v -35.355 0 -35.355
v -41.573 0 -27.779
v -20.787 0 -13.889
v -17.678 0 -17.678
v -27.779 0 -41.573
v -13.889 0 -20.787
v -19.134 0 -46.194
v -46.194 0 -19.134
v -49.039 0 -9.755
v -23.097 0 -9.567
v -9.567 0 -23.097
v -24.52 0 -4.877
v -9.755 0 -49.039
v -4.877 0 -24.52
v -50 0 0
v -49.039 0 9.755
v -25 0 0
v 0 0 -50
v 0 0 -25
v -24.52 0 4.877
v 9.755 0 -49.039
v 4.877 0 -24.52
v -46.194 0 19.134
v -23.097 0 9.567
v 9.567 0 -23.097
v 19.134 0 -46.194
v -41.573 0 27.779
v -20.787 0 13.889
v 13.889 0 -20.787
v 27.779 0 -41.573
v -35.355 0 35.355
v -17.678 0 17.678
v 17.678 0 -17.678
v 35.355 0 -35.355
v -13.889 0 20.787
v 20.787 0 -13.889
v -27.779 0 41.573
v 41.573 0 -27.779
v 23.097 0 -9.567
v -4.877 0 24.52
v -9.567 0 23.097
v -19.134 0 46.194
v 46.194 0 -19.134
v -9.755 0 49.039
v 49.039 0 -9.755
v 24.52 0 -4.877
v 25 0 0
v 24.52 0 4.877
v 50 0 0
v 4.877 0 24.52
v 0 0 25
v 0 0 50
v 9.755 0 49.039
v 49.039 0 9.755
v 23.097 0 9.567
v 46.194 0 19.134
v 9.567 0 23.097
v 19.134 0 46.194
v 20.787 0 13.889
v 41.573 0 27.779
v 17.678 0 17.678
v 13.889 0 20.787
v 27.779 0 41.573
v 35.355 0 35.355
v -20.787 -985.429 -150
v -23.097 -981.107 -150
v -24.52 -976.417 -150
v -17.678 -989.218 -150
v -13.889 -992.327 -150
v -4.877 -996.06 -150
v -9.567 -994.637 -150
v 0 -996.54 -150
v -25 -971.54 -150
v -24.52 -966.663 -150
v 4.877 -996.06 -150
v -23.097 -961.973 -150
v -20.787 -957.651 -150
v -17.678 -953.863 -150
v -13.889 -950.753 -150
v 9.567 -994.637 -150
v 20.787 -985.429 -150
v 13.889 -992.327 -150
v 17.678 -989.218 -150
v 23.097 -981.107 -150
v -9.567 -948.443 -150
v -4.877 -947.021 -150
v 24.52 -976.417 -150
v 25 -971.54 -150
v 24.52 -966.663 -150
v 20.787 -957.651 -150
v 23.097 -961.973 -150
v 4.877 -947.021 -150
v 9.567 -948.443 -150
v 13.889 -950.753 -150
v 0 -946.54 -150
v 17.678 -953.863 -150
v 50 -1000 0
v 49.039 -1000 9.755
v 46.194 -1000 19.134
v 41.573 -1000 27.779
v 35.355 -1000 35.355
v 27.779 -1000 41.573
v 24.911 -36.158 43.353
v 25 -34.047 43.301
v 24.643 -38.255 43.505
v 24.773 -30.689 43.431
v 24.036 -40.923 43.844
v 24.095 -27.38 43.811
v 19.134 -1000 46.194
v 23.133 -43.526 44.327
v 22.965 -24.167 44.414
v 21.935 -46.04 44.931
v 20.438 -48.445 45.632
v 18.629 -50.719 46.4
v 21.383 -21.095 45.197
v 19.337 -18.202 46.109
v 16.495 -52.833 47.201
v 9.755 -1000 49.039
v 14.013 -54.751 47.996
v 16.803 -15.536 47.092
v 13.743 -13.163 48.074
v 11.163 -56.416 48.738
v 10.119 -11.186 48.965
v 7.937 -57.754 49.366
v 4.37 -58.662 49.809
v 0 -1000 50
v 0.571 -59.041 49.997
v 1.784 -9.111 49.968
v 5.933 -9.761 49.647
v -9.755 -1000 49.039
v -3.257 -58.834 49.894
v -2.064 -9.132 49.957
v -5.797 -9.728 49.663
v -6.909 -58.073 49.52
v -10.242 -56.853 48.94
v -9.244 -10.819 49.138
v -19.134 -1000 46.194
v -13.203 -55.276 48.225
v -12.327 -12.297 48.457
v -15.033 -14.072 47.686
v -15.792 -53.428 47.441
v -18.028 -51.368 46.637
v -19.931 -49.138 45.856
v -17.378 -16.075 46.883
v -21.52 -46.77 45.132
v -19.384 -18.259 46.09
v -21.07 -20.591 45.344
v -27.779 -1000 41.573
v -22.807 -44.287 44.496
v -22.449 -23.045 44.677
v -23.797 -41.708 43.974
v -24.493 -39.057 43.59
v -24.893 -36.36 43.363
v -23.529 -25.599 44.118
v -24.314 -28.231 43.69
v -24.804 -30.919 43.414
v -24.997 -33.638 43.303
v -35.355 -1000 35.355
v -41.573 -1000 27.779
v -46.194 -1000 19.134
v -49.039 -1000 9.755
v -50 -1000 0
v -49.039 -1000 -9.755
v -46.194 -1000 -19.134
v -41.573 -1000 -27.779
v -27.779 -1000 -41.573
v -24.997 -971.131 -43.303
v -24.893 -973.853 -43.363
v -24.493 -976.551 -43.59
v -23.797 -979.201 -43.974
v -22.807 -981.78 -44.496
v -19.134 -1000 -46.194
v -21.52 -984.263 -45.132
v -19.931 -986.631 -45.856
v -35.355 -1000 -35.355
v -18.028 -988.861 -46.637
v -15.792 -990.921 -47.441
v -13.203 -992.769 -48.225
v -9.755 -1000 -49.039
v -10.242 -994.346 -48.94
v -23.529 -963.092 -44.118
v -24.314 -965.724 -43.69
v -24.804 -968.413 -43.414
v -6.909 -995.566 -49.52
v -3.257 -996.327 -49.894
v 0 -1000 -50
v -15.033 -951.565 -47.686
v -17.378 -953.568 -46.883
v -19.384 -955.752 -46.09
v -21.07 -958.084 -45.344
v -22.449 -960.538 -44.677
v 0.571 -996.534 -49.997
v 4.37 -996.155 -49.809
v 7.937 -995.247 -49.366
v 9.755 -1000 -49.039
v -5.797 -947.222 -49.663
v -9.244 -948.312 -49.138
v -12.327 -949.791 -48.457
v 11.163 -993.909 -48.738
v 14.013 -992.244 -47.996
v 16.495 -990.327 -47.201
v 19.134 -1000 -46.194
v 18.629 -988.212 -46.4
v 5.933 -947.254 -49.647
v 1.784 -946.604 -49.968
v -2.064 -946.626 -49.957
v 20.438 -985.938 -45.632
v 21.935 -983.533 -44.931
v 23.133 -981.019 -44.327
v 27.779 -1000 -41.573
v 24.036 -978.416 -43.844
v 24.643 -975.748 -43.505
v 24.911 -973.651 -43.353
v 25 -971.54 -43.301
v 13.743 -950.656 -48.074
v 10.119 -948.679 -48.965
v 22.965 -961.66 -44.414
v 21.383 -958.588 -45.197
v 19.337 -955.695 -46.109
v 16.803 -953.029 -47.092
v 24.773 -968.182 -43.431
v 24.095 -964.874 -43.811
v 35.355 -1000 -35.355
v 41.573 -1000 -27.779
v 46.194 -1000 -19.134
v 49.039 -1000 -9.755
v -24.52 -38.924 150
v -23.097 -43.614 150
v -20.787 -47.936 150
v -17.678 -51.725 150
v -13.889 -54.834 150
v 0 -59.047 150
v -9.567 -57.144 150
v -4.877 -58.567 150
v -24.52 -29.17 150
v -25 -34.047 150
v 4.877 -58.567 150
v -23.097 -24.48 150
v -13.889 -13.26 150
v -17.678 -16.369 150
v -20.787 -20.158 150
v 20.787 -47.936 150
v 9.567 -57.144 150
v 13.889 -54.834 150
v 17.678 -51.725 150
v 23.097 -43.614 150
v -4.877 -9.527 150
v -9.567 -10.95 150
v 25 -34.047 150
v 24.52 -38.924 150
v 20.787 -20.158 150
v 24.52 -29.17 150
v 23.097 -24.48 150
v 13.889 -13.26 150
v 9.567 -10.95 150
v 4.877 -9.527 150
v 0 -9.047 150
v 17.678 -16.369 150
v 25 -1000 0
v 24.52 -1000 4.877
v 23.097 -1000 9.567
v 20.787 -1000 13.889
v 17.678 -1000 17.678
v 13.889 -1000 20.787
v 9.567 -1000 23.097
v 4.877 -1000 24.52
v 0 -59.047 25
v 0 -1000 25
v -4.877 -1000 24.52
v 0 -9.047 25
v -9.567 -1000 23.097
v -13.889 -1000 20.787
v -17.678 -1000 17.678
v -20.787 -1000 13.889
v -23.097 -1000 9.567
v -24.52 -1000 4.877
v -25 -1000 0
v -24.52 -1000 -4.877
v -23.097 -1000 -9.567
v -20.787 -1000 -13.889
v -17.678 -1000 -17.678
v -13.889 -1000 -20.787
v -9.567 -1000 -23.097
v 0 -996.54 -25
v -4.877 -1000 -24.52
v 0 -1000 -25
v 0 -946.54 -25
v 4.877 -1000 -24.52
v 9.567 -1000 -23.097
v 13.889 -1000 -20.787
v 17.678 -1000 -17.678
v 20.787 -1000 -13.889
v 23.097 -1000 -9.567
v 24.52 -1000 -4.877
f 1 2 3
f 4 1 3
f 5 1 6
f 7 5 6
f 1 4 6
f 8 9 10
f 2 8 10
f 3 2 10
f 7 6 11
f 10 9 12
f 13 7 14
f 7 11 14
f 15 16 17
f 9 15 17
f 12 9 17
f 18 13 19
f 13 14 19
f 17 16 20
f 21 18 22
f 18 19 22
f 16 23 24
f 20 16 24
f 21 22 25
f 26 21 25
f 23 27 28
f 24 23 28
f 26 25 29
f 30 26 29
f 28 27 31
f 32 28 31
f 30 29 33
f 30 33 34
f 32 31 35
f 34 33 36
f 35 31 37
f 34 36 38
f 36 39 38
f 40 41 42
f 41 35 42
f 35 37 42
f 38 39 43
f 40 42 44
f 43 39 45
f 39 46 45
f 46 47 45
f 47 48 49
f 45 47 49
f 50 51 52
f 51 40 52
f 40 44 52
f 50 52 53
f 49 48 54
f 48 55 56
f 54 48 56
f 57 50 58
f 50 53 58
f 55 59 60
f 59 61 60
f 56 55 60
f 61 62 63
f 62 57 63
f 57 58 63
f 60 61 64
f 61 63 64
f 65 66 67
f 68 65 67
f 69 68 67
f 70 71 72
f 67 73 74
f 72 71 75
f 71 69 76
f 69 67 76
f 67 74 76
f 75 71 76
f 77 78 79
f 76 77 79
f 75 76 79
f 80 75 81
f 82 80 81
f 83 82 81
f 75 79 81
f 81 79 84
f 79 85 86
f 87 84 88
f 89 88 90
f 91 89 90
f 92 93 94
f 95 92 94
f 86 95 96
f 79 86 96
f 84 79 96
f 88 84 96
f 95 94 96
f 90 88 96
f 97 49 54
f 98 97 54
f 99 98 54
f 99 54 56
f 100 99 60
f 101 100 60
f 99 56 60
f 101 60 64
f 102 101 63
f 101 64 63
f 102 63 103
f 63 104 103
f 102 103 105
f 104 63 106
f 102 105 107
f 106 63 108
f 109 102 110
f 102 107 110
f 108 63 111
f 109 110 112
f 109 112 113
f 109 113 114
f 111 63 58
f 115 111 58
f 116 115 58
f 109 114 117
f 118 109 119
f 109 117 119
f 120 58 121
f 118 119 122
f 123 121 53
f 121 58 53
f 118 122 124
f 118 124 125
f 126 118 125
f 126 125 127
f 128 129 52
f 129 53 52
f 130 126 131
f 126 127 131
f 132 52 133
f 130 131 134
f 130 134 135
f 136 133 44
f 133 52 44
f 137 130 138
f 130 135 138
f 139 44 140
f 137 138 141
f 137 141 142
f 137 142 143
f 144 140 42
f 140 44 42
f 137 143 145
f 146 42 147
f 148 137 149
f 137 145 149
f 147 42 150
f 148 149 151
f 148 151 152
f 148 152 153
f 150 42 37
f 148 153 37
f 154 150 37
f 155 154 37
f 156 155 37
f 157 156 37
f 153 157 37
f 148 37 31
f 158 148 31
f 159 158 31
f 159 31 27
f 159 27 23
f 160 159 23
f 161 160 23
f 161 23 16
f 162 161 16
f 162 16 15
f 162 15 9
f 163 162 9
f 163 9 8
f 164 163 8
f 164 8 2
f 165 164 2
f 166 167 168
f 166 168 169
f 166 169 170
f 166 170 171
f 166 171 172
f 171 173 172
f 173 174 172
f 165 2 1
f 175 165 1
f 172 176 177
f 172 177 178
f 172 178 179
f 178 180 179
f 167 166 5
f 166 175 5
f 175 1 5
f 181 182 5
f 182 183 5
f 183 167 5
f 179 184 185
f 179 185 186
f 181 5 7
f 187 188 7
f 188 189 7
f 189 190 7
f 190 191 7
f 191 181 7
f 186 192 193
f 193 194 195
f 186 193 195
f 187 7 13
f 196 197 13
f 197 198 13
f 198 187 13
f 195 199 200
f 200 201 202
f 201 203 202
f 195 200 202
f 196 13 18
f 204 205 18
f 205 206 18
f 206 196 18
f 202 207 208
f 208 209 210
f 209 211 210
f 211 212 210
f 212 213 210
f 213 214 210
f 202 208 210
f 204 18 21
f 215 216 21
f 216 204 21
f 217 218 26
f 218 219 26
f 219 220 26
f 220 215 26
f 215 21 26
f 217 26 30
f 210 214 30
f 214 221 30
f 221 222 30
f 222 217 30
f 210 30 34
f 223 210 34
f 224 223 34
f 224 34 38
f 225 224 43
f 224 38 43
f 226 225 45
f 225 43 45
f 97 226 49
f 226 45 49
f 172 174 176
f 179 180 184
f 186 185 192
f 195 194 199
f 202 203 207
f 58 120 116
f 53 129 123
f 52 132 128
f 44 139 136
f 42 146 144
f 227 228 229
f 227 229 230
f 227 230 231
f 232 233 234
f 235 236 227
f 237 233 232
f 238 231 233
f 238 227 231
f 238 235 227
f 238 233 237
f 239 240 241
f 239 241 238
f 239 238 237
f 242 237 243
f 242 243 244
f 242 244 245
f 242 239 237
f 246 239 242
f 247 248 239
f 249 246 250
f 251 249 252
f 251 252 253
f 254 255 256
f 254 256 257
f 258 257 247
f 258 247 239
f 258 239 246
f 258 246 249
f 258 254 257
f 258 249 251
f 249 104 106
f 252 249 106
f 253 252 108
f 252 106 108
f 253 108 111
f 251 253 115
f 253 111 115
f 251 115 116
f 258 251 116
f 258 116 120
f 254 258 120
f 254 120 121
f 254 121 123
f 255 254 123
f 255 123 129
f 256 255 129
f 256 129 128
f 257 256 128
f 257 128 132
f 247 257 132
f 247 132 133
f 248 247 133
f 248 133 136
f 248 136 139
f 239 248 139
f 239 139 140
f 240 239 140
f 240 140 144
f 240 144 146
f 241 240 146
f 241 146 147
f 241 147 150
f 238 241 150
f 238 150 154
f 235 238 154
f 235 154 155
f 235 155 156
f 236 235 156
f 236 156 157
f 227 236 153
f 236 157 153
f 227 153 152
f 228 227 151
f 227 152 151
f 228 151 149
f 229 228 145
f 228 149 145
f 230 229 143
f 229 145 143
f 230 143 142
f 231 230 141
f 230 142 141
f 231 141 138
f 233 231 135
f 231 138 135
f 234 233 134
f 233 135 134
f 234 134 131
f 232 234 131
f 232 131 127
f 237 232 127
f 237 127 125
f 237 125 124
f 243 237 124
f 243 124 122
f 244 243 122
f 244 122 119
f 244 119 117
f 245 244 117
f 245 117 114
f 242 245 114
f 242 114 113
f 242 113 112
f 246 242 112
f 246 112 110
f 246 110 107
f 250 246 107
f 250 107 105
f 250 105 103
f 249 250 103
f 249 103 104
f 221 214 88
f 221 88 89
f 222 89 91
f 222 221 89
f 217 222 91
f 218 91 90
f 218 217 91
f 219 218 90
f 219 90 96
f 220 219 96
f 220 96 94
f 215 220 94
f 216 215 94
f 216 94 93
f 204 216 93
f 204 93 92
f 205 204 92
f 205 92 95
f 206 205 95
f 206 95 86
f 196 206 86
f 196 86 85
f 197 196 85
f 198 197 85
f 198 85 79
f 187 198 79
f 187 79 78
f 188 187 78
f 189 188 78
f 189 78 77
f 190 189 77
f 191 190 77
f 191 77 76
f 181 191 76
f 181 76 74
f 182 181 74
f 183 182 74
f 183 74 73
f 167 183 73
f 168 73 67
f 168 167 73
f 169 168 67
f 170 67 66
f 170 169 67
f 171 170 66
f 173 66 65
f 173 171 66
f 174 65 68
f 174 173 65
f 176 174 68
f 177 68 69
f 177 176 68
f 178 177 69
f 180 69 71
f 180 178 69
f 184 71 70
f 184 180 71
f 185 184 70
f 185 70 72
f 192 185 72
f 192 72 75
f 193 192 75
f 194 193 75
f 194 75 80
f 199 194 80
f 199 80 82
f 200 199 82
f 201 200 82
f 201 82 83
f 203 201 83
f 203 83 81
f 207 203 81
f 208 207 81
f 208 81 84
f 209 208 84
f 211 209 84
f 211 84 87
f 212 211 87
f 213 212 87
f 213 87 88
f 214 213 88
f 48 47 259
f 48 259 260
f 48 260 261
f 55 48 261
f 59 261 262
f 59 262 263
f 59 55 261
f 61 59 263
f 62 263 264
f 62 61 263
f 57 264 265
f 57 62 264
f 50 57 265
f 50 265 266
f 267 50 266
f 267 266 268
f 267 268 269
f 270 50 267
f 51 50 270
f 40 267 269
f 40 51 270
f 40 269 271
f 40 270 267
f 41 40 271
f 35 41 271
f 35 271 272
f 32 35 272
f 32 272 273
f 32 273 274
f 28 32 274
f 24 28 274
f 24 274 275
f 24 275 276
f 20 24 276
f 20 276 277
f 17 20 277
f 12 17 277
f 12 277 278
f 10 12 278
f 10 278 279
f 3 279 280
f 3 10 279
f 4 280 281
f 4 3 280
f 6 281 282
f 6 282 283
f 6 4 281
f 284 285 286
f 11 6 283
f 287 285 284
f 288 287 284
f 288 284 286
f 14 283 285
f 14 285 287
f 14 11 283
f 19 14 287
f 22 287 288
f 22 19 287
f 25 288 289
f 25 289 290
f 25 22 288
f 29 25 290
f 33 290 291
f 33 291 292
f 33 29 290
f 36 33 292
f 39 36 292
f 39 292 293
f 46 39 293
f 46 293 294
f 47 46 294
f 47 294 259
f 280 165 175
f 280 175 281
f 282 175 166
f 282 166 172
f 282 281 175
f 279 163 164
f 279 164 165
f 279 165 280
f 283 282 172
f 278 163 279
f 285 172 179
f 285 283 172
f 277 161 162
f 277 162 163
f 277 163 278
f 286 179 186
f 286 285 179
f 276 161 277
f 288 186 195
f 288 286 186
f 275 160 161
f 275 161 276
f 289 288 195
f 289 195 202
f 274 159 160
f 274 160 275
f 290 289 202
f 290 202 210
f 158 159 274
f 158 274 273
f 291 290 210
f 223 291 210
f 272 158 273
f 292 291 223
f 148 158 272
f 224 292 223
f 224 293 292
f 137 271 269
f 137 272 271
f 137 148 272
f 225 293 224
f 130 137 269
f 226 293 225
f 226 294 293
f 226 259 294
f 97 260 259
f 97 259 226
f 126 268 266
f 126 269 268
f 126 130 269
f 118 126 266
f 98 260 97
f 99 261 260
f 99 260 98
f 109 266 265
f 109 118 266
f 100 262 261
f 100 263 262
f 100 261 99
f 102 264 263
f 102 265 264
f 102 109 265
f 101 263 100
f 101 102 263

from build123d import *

# Parameters (mm, degrees)
F0_R     = 50
F0_R_2   = 25
F3_DEPTH = 1000
F4_R     = 25
F5_DEPTH = 125
F6_R     = 25
F7_DEPTH = 125


with BuildPart() as f3:
    # F0 (on Front) → F3 (new body)
    with BuildSketch(Plane.XZ):
        Circle(F0_R)
        Circle(F0_R_2, mode=Mode.SUBTRACT)
    extrude(amount=F3_DEPTH)

    # F4 (on offset) → F5 (join)
    with BuildSketch(Plane.XY.offset(-25)):
        with Locations((0, -971.540222)):
            Circle(F4_R)
    extrude(amount=-F5_DEPTH)

    # F6 (on offset) → F7 (join)
    with BuildSketch(Plane.XY.offset(25)):
        with Locations((0, -34.047124)):
            Circle(F6_R)
    extrude(amount=F7_DEPTH)


solid = f3.part
